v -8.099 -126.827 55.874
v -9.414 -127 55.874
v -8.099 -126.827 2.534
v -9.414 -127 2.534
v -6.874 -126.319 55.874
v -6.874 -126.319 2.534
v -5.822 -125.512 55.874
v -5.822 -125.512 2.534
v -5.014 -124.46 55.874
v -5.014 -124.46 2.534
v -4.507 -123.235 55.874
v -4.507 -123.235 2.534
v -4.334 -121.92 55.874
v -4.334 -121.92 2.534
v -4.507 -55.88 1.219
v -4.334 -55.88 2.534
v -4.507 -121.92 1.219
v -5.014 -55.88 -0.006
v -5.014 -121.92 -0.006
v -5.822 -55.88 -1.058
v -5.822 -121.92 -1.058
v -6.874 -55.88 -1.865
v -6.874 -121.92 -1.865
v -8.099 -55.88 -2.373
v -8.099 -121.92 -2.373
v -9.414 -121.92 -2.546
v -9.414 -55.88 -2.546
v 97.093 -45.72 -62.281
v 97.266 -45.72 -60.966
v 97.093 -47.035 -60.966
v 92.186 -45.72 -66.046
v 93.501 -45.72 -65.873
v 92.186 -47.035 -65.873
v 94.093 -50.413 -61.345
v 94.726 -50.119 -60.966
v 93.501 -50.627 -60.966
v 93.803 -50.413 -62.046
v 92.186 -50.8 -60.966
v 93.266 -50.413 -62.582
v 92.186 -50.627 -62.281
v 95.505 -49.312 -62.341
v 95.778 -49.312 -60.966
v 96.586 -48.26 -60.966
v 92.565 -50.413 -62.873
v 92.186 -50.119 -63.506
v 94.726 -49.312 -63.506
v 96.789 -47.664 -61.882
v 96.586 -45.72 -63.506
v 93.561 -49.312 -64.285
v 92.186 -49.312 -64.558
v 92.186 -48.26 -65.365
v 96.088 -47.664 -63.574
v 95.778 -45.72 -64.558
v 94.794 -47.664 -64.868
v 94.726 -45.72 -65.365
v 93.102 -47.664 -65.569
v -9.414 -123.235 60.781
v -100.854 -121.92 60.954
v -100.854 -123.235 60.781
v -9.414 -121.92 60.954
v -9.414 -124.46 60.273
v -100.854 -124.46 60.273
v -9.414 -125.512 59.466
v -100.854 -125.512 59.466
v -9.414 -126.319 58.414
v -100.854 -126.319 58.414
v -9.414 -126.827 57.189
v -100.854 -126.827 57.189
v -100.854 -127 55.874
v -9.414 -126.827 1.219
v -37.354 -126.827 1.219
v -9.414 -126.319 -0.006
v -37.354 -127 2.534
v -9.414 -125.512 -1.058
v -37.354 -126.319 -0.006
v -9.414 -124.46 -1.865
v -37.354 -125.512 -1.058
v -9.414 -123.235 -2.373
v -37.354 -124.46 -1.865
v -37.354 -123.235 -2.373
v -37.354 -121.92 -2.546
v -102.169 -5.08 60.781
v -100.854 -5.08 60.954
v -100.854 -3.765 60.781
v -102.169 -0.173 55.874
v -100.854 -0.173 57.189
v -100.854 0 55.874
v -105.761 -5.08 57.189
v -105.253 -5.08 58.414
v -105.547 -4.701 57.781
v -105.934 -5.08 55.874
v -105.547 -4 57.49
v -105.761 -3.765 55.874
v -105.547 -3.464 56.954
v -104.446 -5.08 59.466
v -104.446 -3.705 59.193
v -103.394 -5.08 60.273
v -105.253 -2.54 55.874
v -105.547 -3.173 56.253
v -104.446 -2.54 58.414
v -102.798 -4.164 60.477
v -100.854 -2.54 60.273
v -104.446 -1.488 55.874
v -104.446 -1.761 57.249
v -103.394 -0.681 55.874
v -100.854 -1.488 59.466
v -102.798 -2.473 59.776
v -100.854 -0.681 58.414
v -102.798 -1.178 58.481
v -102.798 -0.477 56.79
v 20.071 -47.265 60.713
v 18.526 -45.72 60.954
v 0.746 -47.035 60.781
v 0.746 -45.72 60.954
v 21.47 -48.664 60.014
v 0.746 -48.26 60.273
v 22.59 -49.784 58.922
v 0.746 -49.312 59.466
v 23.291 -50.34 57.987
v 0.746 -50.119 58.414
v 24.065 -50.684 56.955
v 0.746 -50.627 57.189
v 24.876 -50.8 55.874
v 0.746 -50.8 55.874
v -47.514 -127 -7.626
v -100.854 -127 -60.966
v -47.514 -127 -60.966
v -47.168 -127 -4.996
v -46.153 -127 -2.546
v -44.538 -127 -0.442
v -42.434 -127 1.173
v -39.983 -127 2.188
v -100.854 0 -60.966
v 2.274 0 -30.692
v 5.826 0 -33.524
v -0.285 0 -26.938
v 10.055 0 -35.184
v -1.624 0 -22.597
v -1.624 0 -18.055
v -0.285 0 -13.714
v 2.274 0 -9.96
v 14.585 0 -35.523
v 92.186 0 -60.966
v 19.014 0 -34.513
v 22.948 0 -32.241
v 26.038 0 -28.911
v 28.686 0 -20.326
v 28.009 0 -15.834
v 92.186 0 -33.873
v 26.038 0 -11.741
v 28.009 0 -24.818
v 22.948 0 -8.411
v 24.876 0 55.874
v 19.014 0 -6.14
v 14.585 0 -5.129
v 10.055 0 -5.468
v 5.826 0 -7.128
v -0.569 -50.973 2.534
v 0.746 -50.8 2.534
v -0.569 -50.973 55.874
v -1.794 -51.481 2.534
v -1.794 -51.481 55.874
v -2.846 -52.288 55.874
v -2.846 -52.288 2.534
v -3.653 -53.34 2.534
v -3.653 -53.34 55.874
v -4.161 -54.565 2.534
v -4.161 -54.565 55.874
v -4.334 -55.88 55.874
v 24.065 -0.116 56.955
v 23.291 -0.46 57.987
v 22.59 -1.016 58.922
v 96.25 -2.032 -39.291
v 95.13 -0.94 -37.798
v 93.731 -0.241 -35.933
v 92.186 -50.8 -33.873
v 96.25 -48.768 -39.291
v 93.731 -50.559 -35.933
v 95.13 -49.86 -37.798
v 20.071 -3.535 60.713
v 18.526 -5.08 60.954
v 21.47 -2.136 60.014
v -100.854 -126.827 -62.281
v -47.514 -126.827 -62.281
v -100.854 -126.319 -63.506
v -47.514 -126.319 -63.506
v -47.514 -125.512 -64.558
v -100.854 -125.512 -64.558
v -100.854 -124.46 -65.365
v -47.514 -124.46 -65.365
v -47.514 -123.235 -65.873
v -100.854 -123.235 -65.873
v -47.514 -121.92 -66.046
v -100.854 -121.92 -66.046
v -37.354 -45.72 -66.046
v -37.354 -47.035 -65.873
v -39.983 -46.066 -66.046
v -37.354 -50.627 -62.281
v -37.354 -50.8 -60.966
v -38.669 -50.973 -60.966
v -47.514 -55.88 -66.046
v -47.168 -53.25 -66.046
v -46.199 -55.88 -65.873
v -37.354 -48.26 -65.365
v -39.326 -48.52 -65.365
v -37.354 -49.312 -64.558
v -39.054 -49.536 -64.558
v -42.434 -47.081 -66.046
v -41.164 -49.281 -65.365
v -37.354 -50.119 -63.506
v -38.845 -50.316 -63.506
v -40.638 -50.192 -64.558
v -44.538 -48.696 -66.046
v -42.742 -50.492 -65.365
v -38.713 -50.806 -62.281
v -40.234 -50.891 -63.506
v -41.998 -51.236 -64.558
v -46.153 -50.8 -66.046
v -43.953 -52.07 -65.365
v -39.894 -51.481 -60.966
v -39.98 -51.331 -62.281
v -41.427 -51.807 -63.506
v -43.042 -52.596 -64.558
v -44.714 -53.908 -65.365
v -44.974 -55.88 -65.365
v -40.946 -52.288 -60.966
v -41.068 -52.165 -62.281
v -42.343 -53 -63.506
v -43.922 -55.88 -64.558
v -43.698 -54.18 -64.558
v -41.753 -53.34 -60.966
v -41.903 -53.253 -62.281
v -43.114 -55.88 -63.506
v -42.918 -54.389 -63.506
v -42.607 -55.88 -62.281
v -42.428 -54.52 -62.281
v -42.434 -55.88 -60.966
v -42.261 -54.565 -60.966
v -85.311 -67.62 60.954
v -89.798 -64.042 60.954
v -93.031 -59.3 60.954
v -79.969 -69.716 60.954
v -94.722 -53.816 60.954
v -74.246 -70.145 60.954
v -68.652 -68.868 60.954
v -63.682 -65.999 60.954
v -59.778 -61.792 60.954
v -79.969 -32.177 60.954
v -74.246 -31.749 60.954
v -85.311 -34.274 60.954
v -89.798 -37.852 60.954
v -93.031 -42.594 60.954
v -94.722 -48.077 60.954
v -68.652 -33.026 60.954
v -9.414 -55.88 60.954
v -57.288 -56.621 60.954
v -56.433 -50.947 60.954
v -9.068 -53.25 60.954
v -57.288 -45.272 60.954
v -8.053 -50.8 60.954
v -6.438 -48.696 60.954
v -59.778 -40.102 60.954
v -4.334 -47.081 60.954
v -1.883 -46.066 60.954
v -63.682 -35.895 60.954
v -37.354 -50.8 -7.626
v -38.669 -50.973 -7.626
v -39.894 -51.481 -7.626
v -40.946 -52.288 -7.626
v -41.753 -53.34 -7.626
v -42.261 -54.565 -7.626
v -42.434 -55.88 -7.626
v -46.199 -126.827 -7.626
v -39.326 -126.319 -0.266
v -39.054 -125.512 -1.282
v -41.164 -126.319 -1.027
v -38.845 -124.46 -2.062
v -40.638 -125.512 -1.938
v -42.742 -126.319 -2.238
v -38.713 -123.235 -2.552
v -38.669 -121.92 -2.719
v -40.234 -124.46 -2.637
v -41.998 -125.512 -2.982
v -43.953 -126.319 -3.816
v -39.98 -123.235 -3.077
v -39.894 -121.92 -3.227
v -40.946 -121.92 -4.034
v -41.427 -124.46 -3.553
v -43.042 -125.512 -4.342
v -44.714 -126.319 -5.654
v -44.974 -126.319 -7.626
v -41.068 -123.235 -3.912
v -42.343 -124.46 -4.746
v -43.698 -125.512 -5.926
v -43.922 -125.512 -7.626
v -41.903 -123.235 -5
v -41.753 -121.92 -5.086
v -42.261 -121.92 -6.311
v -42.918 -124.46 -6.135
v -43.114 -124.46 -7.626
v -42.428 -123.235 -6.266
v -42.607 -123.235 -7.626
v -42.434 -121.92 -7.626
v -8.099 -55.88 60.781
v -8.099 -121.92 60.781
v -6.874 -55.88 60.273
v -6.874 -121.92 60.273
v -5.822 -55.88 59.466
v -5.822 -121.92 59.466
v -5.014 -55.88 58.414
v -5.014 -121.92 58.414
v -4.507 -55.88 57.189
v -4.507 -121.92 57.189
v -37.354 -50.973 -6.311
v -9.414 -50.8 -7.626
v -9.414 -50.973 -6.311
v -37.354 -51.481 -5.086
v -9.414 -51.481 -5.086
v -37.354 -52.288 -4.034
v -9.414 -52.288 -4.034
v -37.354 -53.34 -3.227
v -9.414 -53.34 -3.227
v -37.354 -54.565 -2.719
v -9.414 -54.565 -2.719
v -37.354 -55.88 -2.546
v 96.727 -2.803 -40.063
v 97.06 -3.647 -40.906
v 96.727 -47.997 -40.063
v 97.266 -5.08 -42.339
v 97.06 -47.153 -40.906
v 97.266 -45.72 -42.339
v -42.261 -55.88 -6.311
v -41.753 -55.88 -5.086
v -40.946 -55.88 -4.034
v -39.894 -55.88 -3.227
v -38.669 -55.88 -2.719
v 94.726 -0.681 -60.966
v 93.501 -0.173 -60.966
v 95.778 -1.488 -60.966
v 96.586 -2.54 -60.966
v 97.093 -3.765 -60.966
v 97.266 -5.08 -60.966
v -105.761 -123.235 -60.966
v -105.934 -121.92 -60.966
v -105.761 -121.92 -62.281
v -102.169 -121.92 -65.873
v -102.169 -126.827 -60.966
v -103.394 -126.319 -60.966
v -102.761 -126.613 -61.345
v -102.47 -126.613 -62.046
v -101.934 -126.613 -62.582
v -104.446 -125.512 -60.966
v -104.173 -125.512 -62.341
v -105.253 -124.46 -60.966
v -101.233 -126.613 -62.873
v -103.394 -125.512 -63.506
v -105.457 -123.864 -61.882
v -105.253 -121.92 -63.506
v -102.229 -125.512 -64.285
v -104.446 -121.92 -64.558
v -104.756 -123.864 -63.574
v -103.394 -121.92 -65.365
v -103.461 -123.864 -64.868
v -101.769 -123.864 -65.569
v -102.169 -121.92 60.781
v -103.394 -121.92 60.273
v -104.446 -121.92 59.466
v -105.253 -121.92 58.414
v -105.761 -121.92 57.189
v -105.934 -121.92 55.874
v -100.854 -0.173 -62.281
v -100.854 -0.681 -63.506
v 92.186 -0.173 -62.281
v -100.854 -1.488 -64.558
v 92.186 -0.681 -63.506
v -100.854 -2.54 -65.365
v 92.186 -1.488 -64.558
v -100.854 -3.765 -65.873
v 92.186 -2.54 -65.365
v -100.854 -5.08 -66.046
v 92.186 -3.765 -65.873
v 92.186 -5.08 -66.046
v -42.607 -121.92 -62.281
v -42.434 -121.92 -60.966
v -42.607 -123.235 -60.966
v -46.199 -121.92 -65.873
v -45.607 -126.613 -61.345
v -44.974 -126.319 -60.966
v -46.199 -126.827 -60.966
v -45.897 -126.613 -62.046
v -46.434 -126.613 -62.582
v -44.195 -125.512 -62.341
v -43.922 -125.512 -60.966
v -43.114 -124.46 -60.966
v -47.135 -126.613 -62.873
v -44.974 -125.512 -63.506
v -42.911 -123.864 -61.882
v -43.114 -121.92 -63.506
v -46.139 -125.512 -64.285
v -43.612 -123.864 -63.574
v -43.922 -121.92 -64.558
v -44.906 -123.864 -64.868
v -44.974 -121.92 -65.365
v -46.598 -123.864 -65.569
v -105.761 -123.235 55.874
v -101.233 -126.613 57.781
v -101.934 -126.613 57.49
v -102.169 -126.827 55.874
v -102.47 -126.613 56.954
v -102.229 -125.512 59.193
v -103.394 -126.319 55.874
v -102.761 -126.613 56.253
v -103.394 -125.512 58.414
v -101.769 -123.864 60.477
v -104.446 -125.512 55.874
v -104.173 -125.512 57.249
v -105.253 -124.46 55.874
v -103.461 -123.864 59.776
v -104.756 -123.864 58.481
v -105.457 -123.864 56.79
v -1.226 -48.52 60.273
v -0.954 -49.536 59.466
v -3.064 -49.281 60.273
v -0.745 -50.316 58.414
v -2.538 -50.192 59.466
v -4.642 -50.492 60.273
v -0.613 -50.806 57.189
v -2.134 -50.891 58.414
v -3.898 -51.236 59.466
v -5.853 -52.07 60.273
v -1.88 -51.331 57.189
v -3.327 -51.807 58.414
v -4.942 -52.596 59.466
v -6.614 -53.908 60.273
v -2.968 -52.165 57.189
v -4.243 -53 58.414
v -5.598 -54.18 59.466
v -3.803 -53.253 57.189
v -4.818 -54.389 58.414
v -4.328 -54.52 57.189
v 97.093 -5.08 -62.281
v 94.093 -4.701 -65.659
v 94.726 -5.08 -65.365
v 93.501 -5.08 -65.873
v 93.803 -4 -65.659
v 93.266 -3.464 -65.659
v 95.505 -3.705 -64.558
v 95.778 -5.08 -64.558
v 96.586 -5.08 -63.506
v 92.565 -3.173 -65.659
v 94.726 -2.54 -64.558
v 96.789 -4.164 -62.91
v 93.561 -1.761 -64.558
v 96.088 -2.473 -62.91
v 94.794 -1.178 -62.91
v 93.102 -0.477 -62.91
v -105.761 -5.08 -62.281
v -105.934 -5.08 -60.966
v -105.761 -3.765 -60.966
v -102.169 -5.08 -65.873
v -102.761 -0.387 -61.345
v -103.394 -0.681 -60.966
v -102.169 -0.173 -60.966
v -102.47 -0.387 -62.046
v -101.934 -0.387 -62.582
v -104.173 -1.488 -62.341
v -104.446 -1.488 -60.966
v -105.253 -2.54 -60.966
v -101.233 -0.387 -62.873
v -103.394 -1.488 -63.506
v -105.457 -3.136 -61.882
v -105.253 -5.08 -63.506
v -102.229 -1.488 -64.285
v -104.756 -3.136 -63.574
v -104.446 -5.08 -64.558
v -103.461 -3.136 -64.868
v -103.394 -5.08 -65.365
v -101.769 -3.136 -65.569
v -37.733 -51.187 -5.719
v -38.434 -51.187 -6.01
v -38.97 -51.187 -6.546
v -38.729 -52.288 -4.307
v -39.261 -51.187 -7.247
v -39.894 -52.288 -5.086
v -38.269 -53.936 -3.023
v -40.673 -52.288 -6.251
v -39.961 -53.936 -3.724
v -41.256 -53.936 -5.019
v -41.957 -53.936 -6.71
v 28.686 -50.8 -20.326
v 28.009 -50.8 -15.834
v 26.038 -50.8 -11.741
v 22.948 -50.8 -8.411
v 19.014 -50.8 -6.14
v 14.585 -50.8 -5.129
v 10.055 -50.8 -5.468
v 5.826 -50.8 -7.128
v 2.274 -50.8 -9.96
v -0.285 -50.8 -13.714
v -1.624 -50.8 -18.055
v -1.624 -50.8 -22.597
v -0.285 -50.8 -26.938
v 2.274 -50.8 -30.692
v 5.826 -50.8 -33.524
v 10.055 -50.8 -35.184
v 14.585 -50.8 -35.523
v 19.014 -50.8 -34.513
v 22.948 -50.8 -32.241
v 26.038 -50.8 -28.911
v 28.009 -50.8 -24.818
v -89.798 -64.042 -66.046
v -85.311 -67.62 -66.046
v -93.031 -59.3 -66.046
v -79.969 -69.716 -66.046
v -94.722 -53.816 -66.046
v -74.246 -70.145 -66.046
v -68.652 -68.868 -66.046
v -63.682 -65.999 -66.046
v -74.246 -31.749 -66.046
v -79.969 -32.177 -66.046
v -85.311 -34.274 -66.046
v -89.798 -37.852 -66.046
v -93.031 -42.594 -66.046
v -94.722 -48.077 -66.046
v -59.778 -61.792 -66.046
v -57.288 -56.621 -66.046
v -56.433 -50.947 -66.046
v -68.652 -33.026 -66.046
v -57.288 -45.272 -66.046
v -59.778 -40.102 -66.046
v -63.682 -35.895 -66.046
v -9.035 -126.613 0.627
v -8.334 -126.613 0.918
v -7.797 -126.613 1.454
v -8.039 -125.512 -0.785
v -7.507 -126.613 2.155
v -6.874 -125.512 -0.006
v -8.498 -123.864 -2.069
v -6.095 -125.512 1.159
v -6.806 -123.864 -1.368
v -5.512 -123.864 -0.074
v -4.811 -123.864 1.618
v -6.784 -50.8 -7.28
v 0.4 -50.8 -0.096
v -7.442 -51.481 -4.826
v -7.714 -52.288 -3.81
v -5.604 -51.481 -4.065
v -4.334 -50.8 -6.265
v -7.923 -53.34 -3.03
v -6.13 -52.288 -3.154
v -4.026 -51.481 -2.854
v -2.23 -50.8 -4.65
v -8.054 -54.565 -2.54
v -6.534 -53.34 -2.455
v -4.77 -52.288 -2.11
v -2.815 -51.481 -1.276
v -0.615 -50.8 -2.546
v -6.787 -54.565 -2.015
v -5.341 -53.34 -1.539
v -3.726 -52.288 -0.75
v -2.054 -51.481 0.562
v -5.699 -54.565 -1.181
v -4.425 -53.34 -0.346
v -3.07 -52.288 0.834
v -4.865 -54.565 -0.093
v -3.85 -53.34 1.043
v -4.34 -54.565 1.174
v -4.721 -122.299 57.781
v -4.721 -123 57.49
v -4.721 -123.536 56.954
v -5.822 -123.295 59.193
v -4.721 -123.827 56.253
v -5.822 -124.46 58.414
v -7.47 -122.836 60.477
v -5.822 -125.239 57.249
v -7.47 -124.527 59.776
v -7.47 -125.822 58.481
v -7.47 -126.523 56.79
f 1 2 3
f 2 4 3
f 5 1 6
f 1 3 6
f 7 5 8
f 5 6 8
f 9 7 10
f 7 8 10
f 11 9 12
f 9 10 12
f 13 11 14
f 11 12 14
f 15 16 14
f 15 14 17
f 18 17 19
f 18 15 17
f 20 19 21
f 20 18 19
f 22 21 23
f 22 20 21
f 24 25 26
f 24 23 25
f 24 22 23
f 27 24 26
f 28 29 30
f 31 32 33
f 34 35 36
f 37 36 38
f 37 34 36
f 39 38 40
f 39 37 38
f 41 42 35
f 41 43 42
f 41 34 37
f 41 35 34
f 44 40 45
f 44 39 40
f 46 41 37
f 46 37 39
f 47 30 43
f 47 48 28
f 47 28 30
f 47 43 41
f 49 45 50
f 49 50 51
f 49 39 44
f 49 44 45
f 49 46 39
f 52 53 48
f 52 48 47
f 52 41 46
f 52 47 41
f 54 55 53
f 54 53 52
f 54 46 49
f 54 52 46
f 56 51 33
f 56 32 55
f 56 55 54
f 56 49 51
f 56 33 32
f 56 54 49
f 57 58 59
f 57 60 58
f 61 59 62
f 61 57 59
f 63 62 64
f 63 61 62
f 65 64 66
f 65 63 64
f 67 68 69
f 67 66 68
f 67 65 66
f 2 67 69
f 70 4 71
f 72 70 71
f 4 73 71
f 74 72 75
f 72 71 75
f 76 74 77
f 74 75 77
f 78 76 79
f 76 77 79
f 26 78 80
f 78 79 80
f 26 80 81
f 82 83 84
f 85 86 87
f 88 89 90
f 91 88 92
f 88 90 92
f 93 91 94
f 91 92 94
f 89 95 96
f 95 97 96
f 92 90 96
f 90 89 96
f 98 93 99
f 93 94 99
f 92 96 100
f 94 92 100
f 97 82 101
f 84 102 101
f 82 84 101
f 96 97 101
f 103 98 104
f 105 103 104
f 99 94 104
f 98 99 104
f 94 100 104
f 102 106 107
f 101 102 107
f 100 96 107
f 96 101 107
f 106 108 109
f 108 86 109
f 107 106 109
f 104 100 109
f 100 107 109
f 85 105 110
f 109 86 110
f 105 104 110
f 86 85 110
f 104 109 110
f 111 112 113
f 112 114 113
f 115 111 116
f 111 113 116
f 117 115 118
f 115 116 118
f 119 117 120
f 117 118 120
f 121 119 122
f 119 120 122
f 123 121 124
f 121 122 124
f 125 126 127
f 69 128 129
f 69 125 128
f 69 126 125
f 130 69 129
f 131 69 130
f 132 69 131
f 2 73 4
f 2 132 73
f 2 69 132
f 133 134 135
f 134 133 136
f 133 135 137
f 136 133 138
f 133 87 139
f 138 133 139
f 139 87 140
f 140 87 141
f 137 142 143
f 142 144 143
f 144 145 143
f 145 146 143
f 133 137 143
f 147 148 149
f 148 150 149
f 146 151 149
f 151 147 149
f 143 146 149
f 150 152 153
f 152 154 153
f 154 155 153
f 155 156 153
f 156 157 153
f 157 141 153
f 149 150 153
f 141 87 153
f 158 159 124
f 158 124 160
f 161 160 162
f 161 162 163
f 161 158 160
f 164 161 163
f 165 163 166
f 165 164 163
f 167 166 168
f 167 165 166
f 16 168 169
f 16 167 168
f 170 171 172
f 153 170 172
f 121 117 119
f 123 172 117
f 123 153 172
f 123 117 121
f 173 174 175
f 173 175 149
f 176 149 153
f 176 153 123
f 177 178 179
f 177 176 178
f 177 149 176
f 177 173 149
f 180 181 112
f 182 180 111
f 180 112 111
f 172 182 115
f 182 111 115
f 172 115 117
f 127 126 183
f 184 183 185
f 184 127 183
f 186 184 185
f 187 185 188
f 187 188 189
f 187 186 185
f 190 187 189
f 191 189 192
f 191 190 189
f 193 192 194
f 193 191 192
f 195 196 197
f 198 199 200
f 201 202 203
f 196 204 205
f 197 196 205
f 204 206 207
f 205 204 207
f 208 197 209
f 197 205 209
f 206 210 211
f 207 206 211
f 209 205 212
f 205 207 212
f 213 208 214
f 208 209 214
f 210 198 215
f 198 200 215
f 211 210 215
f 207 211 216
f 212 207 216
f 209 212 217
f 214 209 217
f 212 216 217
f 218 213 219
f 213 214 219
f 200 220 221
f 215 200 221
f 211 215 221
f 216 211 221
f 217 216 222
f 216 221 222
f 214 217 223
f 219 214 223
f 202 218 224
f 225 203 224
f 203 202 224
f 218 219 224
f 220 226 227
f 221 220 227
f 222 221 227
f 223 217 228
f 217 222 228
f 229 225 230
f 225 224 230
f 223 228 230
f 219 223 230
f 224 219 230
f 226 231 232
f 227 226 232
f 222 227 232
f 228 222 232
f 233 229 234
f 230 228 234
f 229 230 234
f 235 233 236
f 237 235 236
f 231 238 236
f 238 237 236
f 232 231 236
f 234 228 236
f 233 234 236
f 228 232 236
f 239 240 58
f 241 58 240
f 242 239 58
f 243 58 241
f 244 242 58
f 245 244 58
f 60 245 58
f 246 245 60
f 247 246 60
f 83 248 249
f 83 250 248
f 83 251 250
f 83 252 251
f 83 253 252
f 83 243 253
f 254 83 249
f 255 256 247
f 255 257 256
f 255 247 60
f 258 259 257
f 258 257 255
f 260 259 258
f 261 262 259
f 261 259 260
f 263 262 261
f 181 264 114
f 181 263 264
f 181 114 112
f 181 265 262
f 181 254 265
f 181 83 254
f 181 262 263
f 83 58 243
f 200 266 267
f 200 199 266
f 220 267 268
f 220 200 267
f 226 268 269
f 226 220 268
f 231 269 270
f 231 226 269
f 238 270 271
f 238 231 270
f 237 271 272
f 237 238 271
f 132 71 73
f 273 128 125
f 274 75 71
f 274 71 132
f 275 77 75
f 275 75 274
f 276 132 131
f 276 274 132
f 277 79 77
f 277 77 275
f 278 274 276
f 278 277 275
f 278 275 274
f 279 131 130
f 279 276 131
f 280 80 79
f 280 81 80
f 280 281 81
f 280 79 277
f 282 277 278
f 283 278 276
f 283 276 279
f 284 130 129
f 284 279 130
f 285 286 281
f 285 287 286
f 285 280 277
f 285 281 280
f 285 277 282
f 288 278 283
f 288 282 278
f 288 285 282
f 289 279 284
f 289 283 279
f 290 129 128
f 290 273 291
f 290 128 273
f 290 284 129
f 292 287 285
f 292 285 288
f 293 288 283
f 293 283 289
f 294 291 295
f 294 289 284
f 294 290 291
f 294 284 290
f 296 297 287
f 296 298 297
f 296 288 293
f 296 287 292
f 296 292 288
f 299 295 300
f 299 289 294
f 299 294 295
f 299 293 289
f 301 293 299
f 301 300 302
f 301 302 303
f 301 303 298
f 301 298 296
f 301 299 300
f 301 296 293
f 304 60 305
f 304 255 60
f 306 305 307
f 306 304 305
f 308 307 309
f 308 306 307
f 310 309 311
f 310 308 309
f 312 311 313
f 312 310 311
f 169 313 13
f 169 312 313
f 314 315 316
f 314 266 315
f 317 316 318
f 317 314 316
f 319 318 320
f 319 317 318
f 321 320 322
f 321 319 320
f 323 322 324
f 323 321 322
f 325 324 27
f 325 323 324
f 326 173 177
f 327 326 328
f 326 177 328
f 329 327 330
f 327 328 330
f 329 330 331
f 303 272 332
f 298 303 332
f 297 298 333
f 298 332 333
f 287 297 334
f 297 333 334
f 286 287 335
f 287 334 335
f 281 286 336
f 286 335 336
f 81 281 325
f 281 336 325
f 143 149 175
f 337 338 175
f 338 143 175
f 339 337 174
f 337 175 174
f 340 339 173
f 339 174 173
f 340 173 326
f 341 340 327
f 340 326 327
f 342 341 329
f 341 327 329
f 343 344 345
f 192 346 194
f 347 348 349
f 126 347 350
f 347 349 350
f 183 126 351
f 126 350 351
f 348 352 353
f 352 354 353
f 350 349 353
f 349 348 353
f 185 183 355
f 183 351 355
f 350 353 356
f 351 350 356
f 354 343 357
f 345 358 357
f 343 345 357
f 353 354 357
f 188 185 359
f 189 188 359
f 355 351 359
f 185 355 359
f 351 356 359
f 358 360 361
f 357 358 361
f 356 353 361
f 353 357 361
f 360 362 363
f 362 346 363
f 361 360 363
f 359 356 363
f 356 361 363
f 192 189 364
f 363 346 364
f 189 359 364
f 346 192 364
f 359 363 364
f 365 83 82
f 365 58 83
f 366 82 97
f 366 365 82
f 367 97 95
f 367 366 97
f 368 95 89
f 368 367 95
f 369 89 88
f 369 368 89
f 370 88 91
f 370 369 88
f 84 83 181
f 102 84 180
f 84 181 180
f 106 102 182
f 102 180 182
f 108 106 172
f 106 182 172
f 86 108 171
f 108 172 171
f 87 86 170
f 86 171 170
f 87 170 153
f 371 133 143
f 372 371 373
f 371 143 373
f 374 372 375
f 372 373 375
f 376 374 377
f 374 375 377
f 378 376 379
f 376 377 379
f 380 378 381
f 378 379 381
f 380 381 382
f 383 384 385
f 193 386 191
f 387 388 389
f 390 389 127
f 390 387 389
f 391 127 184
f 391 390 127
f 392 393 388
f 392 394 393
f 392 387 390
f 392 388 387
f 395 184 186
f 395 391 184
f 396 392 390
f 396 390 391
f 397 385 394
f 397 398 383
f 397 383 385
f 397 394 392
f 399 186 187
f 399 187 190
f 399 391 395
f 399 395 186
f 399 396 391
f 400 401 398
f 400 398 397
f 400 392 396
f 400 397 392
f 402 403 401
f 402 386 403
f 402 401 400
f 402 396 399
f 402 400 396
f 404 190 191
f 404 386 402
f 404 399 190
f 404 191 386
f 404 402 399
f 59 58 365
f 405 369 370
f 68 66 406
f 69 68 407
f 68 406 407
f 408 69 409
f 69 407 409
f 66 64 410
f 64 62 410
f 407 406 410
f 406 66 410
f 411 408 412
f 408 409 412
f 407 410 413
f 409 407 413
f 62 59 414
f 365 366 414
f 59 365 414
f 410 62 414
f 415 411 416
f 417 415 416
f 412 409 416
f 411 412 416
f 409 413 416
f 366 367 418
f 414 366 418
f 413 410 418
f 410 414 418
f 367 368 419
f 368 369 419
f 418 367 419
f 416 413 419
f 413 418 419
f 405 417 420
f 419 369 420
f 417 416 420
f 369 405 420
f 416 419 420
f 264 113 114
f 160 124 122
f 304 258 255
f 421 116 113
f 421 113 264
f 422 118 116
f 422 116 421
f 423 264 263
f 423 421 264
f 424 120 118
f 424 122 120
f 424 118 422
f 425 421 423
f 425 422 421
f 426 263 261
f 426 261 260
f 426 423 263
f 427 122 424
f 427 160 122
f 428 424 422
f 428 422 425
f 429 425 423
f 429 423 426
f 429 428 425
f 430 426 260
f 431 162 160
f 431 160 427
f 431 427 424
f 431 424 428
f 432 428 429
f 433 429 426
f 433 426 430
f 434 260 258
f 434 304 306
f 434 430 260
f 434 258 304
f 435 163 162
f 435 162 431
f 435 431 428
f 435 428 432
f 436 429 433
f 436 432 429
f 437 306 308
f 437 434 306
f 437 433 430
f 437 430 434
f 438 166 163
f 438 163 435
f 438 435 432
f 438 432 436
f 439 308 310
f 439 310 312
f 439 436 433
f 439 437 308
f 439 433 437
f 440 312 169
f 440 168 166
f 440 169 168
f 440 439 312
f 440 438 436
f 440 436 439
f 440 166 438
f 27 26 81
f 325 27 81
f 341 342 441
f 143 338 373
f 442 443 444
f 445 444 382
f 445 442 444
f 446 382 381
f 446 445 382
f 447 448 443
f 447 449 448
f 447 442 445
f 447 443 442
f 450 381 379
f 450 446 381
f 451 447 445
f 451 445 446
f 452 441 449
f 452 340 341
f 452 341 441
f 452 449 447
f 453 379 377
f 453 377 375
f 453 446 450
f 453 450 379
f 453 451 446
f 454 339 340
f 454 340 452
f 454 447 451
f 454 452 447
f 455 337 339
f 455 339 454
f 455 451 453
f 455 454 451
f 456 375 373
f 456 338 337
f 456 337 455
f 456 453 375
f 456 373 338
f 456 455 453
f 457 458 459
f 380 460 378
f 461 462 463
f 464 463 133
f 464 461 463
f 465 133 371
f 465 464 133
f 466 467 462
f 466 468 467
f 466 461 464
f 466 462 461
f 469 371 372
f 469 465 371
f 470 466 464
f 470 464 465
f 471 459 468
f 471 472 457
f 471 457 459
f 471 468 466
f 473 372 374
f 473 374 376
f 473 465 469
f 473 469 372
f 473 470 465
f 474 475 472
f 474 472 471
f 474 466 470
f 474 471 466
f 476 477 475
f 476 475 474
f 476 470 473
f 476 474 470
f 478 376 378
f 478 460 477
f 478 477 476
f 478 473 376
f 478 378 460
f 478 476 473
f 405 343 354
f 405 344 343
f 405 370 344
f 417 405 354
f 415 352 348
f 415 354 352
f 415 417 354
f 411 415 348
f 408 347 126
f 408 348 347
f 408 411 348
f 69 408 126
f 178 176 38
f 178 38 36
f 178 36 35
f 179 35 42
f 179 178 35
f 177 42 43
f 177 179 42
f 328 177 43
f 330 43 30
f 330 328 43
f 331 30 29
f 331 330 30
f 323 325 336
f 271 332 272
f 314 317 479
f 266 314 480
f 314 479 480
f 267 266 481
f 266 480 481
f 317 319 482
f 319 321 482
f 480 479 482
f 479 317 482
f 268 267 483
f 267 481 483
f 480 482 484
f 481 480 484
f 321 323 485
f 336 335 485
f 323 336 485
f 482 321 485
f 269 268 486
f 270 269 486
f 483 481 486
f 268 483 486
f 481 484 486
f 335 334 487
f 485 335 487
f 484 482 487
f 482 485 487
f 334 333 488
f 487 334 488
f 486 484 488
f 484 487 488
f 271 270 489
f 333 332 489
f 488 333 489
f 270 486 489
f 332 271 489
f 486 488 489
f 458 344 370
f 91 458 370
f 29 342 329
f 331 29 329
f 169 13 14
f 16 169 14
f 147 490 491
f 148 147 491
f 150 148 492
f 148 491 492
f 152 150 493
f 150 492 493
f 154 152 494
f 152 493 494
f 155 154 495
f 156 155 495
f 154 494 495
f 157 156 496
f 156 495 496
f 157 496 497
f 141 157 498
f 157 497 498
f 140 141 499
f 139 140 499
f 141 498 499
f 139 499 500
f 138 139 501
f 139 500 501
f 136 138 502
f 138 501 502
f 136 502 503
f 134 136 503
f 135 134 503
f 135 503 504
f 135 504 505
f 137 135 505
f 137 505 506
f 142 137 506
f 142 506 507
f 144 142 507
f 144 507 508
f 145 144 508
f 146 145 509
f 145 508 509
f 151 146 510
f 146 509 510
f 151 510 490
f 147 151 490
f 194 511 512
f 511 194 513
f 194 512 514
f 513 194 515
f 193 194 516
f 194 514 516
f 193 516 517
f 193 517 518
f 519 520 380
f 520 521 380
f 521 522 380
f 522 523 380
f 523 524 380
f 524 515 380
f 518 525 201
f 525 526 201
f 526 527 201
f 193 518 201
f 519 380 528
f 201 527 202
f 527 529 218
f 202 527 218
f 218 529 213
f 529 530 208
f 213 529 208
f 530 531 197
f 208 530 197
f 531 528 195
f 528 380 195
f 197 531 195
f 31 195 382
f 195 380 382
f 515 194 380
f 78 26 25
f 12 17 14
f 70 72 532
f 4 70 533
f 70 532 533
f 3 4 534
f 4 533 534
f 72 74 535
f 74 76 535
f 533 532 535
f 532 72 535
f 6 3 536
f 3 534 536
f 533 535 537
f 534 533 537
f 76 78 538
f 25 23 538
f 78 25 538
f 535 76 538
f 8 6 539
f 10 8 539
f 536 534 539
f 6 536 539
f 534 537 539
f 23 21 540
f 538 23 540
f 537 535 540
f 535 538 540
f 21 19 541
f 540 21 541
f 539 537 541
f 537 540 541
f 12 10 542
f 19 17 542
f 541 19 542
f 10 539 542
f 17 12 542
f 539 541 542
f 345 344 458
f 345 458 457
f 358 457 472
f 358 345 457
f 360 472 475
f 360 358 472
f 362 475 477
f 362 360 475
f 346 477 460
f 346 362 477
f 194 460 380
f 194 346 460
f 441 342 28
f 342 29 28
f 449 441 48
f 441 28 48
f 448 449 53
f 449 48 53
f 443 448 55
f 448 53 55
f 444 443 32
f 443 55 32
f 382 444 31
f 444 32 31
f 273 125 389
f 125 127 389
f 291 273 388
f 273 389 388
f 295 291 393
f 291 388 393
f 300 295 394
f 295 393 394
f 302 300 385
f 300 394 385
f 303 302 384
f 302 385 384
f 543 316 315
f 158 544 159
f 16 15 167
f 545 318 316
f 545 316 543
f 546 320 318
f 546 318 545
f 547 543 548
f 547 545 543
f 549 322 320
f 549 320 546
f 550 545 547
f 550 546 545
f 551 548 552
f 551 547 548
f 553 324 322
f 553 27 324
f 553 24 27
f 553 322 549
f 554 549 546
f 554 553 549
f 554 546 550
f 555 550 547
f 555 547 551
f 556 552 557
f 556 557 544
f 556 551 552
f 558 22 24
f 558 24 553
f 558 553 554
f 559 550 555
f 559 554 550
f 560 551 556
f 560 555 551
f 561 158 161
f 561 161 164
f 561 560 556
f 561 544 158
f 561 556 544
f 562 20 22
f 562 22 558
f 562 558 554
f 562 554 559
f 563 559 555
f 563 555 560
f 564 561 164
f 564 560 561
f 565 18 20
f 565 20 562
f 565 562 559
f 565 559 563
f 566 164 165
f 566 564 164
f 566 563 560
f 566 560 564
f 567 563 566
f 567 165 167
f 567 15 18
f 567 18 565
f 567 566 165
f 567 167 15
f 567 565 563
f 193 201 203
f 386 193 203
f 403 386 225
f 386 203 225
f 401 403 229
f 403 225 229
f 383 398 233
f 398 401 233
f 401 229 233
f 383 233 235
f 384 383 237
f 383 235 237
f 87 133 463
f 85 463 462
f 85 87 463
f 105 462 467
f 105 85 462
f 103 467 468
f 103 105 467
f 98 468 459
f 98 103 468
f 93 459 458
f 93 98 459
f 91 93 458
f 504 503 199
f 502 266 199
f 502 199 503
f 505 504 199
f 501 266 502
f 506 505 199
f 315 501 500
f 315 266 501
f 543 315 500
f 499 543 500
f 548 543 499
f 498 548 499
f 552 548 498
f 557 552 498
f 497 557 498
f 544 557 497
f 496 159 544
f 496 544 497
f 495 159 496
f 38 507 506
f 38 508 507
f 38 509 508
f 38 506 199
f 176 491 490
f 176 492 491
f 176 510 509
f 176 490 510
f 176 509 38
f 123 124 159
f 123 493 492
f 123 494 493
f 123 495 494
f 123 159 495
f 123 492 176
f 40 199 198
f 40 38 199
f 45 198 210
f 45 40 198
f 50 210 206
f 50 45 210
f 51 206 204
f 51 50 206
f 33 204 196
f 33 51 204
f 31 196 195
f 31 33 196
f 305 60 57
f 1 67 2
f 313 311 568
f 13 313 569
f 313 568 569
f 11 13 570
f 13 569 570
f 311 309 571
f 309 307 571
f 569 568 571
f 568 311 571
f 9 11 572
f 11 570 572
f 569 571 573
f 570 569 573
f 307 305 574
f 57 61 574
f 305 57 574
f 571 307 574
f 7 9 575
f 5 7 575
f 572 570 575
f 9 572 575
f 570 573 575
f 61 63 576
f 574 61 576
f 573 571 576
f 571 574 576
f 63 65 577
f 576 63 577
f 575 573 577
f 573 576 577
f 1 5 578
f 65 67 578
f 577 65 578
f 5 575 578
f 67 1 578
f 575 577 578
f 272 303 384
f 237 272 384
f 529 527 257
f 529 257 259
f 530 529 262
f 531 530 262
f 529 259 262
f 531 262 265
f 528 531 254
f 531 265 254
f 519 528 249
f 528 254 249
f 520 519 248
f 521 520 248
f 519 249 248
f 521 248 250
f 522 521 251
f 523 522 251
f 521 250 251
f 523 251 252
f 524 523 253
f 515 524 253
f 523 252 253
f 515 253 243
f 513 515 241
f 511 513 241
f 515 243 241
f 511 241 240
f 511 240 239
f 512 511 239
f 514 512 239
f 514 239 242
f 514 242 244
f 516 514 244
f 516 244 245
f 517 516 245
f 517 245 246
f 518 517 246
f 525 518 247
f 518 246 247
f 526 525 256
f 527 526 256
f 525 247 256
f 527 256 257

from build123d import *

# Parameters (mm, degrees)
F0_W     = 203.2
F0_H     = 127
F1_DEPTH = 127
F3_DEPTH = 76.2
F4_SIZE2 = 101.6
F4_SIZE  = 76.2
F5_R     = 5.08
F6_R     = 15.24
F7_DEPTH = 50.8
F8_R     = 19.252046471
F9_DEPTH = 127


with BuildPart() as f1:
    # F0 (on Front) → F1 (new body)
    with BuildSketch(Plane.XZ):
        with Locations((-4.3338742107, -2.5460490198)):
            Rectangle(F0_W, F0_H)
    extrude(amount=F1_DEPTH)

    # F2 (on face) → F3 (cut)
    with BuildSketch(Plane.XZ.offset(127)):
        Polygon((-42.4338742107, -2.5460490198), (-42.4338742107, -66.0460490198), (97.2661257893, -66.0460490198), (97.2661257893, 60.9539509802), (-4.3338742107, 60.9539509802), (-4.3338742107, -2.5460490198), align=None)
    extrude(amount=-F3_DEPTH, mode=Mode.SUBTRACT)

    # F4
    f4_edges = [f1.edges().sort_by_distance(p)[0] for p in [
        (97.266126, -25.4, 60.953951),
    ]]
    f4_side = f1.faces().sort_by_distance((-26.105303, -52.614286, 60.953951))[0]
    chamfer(f4_edges, length=F4_SIZE, length2=F4_SIZE2, reference=f4_side)

    # F5
    f5_edges = [f1.edges().sort_by_distance(p)[0] for p in [
        (-4.333874, -88.9, -2.546049),
        (-42.433874, -88.9, -2.546049),
        (-23.383874, -127, -2.546049),
        (-23.383874, -50.8, -2.546049),
        (-42.433874, 0, 60.953951),
        (21.066126, -25.4, 60.953951),
        (-105.933874, -63.5, 60.953951),
        (8.366126, -50.8, 60.953951),
        (-55.133874, -127, 60.953951),
        (-4.333874, -88.9, 60.953951),
        (-4.333874, -127, 29.203951),
        (-4.333874, -50.8, 29.203951),
        (-42.433874, -88.9, -66.046049),
        (-42.433874, -127, -34.296049),
        (-42.433874, -50.8, -34.296049),
        (97.266126, 0, -53.346049),
        (97.266126, -25.4, -40.646049),
        (97.266126, -25.4, -66.046049),
        (97.266126, -50.8, -53.346049),
        (-105.933874, -63.5, -66.046049),
        (-105.933874, 0, -2.546049),
        (-105.933874, -127, -2.546049),
        (-4.333874, 0, -66.046049),
        (27.416126, -50.8, -66.046049),
        (-74.183874, -127, -66.046049),
    ]]
    fillet(f5_edges, radius=F5_R)

    # F6 (on face) → F7 (cut, through all)
    with BuildSketch(Plane.XZ.offset(50.8)):
        with Locations((13.4461257893, -20.3260490198)):
            Circle(F6_R)
    extrude(amount=-F7_DEPTH, mode=Mode.SUBTRACT)

    # F8 (on face) → F9 (cut, through all)
    with BuildSketch(Plane.XY.offset(60.9539509802)):
        with Locations((-75.6851807237, -50.9467981756)):
            Circle(F8_R)
    extrude(amount=-F9_DEPTH, mode=Mode.SUBTRACT)


solid = f1.part
